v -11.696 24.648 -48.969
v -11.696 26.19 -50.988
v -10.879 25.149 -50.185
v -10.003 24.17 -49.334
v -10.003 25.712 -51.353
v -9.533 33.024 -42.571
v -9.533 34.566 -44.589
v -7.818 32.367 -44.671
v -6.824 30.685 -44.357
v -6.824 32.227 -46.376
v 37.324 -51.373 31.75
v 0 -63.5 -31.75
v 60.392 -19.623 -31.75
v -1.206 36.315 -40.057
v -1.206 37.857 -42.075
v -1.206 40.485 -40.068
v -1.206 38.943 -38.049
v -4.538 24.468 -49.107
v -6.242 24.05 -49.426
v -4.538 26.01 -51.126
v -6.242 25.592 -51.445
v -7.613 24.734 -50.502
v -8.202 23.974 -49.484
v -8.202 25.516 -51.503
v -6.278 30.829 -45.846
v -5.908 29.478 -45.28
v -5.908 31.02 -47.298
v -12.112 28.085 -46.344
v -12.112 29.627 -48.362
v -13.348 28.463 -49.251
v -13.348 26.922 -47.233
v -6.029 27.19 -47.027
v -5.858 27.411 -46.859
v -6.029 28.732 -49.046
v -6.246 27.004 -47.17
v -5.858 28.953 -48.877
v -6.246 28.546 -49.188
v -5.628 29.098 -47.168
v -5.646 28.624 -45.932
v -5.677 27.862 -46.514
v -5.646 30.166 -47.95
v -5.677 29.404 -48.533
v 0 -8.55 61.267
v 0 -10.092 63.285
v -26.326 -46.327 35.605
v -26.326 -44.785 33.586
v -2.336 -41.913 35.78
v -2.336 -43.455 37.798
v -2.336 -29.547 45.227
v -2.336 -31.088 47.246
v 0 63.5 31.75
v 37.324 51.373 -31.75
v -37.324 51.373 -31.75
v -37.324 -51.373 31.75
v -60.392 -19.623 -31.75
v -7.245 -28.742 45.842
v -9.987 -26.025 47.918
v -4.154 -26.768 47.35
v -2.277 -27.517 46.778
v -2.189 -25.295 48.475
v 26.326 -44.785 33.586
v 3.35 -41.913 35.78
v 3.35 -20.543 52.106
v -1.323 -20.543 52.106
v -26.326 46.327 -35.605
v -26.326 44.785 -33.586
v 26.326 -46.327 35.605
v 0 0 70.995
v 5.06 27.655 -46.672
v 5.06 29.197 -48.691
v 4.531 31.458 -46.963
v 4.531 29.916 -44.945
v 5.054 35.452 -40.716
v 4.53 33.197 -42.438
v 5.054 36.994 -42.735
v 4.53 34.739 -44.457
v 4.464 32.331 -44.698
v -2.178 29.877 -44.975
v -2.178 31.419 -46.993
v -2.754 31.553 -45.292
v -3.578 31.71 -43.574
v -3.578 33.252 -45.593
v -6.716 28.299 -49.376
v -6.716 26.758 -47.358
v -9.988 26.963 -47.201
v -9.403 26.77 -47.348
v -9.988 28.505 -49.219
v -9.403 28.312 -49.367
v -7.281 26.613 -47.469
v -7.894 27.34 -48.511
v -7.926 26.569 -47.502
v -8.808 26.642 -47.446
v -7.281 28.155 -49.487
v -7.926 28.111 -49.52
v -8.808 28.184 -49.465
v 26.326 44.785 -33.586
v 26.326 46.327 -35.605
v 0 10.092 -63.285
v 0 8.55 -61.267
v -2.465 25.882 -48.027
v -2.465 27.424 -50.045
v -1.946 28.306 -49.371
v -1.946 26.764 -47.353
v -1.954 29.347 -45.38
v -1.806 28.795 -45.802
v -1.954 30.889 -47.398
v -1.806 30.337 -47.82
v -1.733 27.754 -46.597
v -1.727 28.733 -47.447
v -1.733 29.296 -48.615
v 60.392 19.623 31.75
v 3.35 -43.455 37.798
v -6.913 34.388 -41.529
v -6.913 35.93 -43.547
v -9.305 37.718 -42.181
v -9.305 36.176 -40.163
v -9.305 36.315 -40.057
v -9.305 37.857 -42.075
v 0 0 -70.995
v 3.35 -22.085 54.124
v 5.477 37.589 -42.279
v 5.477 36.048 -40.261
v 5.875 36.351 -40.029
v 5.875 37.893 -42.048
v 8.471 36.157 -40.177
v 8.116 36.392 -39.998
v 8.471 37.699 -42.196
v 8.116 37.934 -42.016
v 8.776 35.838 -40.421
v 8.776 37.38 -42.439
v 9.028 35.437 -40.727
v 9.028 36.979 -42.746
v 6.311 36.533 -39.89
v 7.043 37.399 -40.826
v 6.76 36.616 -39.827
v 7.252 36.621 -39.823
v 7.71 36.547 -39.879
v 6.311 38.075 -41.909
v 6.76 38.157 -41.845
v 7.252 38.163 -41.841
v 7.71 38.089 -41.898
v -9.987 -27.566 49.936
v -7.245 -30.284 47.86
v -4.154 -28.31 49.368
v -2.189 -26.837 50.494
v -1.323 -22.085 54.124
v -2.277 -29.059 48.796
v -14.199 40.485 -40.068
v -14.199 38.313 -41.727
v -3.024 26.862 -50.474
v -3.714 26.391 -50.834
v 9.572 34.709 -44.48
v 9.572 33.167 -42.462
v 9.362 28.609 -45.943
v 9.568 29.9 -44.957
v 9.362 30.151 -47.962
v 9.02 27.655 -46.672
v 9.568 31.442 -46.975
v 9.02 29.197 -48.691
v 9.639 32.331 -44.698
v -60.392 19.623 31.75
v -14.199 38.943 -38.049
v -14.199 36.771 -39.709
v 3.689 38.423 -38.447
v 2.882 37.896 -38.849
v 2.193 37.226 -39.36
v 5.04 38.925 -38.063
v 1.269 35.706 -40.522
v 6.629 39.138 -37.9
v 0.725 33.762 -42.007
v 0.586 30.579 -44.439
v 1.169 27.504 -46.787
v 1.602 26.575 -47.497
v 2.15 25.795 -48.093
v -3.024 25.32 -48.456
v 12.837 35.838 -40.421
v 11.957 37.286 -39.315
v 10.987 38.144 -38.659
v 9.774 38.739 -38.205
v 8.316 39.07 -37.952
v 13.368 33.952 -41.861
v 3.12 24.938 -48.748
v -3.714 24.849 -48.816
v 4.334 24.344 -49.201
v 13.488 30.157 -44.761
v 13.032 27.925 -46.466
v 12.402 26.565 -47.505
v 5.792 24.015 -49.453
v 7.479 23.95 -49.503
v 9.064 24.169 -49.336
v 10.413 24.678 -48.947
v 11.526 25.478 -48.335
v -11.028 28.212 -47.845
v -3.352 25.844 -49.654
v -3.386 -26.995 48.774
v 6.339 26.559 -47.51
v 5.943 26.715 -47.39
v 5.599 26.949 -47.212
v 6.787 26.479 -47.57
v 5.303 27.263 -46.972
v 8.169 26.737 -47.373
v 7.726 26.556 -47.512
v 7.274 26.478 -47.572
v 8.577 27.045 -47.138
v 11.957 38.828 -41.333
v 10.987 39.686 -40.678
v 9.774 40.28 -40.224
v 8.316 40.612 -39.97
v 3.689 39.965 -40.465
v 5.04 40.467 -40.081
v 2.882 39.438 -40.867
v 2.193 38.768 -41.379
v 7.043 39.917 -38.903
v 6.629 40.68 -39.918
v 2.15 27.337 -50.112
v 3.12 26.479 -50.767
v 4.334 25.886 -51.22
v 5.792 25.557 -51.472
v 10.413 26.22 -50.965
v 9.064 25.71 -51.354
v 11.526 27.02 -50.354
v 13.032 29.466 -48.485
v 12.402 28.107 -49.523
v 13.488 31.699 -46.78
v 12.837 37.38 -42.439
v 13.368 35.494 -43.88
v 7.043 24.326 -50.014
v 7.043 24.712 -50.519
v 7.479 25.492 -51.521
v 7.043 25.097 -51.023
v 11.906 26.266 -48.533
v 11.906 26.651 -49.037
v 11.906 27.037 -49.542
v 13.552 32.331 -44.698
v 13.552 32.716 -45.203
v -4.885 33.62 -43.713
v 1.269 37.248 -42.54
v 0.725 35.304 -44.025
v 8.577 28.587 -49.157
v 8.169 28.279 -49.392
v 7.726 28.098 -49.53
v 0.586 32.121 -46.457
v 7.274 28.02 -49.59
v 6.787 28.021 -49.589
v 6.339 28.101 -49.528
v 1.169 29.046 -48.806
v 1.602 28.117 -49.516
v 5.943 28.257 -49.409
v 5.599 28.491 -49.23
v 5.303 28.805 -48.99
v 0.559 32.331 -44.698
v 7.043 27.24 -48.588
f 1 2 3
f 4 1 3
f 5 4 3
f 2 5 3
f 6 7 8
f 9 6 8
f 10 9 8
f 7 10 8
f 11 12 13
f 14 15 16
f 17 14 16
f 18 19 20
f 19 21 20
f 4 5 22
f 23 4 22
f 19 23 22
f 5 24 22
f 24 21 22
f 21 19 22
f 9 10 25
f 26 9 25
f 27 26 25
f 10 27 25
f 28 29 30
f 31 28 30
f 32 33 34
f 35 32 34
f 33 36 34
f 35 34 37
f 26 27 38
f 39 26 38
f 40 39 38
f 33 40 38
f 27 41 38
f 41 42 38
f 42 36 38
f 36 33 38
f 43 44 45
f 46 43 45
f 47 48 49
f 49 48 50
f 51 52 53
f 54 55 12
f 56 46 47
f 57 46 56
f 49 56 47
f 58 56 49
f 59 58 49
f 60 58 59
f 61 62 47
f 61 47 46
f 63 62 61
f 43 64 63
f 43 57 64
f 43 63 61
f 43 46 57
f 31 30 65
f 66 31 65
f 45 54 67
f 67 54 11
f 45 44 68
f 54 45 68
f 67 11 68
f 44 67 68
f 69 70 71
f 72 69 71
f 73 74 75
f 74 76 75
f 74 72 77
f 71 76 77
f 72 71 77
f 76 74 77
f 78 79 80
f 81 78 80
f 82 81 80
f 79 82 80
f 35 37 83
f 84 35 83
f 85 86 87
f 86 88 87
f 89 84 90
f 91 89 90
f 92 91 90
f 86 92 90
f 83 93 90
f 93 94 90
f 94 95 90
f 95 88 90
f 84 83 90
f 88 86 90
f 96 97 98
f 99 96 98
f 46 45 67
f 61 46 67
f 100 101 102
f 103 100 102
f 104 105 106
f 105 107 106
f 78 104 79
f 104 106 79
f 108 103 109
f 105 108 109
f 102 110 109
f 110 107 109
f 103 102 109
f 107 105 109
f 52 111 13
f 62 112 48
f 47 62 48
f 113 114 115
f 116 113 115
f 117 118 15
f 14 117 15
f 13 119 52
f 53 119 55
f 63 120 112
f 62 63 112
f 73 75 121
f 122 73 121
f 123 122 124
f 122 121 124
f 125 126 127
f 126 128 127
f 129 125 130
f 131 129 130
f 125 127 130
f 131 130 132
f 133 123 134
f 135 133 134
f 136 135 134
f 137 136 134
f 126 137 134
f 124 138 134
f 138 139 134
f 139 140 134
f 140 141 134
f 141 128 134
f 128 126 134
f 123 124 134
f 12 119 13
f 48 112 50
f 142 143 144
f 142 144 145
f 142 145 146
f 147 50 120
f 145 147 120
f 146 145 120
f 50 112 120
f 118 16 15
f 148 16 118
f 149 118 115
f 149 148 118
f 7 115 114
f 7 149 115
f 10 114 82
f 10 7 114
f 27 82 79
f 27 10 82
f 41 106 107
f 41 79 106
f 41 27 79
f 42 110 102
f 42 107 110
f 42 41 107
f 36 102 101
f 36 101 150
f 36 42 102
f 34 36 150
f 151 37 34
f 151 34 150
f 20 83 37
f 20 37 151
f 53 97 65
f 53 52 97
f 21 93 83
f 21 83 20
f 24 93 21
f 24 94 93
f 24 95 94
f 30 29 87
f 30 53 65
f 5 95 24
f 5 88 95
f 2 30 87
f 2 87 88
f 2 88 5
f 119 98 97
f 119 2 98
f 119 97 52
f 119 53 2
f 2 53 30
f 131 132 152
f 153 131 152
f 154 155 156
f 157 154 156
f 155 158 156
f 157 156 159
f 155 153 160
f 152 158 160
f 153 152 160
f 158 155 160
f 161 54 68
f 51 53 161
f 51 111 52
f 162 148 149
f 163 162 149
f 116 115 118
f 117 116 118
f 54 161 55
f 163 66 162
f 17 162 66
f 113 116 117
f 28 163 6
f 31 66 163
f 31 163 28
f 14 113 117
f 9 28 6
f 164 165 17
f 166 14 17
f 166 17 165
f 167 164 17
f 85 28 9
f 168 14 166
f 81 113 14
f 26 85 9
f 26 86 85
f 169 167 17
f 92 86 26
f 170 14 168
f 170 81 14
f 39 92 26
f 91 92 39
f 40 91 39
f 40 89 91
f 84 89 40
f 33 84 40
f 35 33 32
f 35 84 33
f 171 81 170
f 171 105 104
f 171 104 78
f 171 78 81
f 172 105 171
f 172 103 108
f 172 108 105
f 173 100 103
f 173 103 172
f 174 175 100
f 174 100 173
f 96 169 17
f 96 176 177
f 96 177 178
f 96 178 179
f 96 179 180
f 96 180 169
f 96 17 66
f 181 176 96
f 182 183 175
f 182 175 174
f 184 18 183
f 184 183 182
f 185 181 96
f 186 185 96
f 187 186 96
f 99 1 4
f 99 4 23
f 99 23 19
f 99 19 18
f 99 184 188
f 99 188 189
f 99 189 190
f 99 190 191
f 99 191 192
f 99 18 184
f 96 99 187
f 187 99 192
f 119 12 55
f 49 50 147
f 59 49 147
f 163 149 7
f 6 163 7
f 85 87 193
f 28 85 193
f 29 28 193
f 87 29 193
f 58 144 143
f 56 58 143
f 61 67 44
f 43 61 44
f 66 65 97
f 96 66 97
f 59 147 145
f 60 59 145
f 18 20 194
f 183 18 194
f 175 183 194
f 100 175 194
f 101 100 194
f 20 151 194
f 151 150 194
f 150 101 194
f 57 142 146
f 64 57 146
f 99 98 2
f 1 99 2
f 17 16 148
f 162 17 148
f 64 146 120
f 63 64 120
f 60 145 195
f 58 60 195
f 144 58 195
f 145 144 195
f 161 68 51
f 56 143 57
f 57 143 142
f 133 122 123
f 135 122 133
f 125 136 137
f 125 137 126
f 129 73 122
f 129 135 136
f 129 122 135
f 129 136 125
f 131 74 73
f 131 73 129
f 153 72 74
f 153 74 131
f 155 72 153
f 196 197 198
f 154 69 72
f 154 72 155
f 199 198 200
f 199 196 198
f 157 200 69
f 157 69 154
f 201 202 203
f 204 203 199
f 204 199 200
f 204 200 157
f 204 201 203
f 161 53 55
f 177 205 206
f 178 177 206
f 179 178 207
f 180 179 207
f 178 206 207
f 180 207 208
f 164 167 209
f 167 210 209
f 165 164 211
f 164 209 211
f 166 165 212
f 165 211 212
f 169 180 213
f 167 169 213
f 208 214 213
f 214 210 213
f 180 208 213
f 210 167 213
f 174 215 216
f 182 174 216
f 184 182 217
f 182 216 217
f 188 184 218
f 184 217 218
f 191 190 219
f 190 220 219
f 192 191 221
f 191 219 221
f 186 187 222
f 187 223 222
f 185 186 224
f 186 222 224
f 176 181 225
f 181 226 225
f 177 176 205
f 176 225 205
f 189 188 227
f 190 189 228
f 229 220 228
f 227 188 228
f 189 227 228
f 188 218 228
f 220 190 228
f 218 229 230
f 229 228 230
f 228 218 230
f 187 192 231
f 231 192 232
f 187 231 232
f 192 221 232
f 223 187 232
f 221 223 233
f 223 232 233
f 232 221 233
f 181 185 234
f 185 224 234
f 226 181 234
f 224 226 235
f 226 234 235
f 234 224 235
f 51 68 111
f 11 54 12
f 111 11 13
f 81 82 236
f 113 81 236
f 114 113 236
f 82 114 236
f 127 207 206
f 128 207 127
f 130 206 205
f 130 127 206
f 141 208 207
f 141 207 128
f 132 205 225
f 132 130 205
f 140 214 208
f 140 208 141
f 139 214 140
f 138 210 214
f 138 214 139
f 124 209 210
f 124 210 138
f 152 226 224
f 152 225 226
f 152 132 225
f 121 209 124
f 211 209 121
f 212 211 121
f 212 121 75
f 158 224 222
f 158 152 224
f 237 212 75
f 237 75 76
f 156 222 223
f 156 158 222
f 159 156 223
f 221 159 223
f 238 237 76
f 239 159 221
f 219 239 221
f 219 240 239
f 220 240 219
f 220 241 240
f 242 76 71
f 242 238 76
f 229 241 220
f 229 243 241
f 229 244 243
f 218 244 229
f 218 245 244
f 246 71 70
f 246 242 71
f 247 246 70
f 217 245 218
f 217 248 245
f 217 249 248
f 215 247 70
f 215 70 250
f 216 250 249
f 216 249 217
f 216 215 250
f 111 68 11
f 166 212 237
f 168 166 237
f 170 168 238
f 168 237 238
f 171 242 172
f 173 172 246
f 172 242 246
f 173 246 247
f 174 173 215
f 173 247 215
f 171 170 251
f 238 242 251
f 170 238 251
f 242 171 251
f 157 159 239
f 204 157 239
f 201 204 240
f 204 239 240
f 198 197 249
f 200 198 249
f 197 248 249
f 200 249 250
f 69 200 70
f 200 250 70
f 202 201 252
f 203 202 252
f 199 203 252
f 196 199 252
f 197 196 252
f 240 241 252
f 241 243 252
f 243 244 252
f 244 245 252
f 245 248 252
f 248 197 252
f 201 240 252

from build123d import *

# Parameters (mm, degrees)
F12_DEPTH      = 37.3243635206
F12_DEPTH_BACK = 37.3243635206
F15_DEPTH      = 37.3243635206
F15_DEPTH_BACK = 37.3243635206
F18_DEPTH      = 37.3243635206
F18_DEPTH_BACK = 37.3243635206
F21_DEPTH      = 37.3243635206
F21_DEPTH_BACK = 37.3243635206
F24_DEPTH      = 37.3243635206
F24_DEPTH_BACK = 37.3243635206
F28_DEPTH      = 99.1671965959
F28_DEPTH_BACK = 99.1671965959
F32_DEPTH      = 89.4601183415
F32_DEPTH_BACK = 89.4601183415
F35_DEPTH      = 89.4601183415
F35_DEPTH_BACK = 88.5596960493
F39_DEPTH      = 99.1671965959
F39_DEPTH_BACK = 96.8098604305
F42_DEPTH      = 68.0823305395
F42_DEPTH_BACK = 70.9961582856
F45_DEPTH      = 92.4043169267
F45_DEPTH_BACK = 99.1671965959
F48_DEPTH      = 81.4313769211
F48_DEPTH_BACK = 89.4601183415
F52_DEPTH      = 88.5596960493
F52_DEPTH_BACK = 82.3317992133
F56_DEPTH      = 92.4043169267
F56_DEPTH_BACK = 96.8098604305
F59_DEPTH      = 68.0823305395
F59_DEPTH_BACK = 68.0823305395
F62_DEPTH      = 37.3243635206
F62_DEPTH_BACK = 37.3243635206
F65_DEPTH      = 68.0823305395
F65_DEPTH_BACK = 68.0823305395
F68_DEPTH      = 81.4313769211
F68_DEPTH_BACK = 81.4313769211
F71_DEPTH      = 92.4043169267
F71_DEPTH_BACK = 92.4043169267
F74_DEPTH      = 92.4043169267
F74_DEPTH_BACK = 92.4043169267
F76_DEPTH      = 2.54
F78_DEPTH      = 2.54


# Not quite as in the source:
# - a feature names something its author has since deleted; it is built from what else it names


with BuildPart() as f9:
    # F7 (on Front) → F9 (revolve)
    with BuildSketch(Plane.XZ):
        with BuildLine():
            Line((0, 0), (0, 31.75))
            Line((0, 31.75), (0, 70.9951582856))
            ThreePointArc((0, 70.9951582856), (-70.9951582856, 0), (0, -70.9951582856))
            Line((0, -70.9951582856), (0, -31.75))
            Line((0, -31.75), (0, 0))
        make_face()
    revolve(axis=Axis((0, 0, -35.4975791428), (0, 0, -1)))

    # F11 (on 3pt) → F12 (cut, two sides)
    with BuildSketch(Plane(origin=(0, 0, 0), x_dir=(-0.5877852523, 0.8090169944, 0), z_dir=(0.8090169944, 0.5877852523, 0))) as f12_sk:
        Polygon((-63.5, -70.9951582856), (0, -70.9951582856), (-51.3725791428, -31.75), (-63.5, -31.75), align=None)
    extrude(amount=F12_DEPTH, mode=Mode.SUBTRACT)
    extrude(f12_sk.sketch, amount=-F12_DEPTH_BACK, mode=Mode.SUBTRACT)

    # F14 (on 3pt) → F15 (cut, two sides)
    with BuildSketch(Plane(origin=(0, 0, 0), x_dir=(-0.5877852523, -0.8090169944, 0), z_dir=(-0.8090169944, 0.5877852523, 0))) as f15_sk:
        Polygon((51.3725791428, -31.75), (0, -70.9951582856), (63.5, -70.9951582856), (63.5, -31.75), align=None)
    extrude(amount=-F15_DEPTH, mode=Mode.SUBTRACT)
    extrude(f15_sk.sketch, amount=F15_DEPTH_BACK, mode=Mode.SUBTRACT)

    # F17 (on 3pt) → F18 (cut, two sides)
    with BuildSketch(Plane(origin=(0, 0, 0), x_dir=(0.9510565163, -0.3090169944, 0), z_dir=(-0.3090169944, -0.9510565163, 0))) as f18_sk:
        Polygon((-63.5, -70.9951582856), (0, -70.9951582856), (-51.3725791428, -31.75), (-63.5, -31.75), align=None)
    extrude(amount=-F18_DEPTH, mode=Mode.SUBTRACT)
    extrude(f18_sk.sketch, amount=F18_DEPTH_BACK, mode=Mode.SUBTRACT)

    # F20 (on 3pt) → F21 (cut, two sides)
    with BuildSketch(Plane.YZ) as f21_sk:
        Polygon((51.3725791428, -31.75), (0, -70.9951582856), (63.5, -70.9951582856), (63.5, -31.75), align=None)
    extrude(amount=-F21_DEPTH, mode=Mode.SUBTRACT)
    extrude(f21_sk.sketch, amount=F21_DEPTH_BACK, mode=Mode.SUBTRACT)

    # F23 (on 3pt) → F24 (cut, two sides)
    with BuildSketch(Plane(origin=(0, 0, 0), x_dir=(-0.9510565163, -0.3090169944, 0), z_dir=(-0.3090169944, 0.9510565163, 0))) as f24_sk:
        Polygon((-63.5, -70.9951582856), (0, -70.9951582856), (-51.3725791428, -31.75), (-63.5, -31.75), align=None)
    extrude(amount=F24_DEPTH, mode=Mode.SUBTRACT)
    extrude(f24_sk.sketch, amount=-F24_DEPTH_BACK, mode=Mode.SUBTRACT)

    # F27 (on 3pt) → F28 (cut, two sides)
    with BuildSketch(Plane(origin=(0, 0, 0), x_dir=(-0.5877852523, 0.8090169944, 0), z_dir=(0.8090169944, 0.5877852523, 0))) as f28_sk:
        Polygon((-70.9951582856, -31.75), (-51.3725791428, -31.75), (-63.5, 31.75), (-70.9951582856, 31.75), align=None)
    extrude(amount=F28_DEPTH, mode=Mode.SUBTRACT)
    extrude(f28_sk.sketch, amount=-F28_DEPTH_BACK, mode=Mode.SUBTRACT)

    # F31 (on 3pt) → F32 (cut, two sides)
    with BuildSketch(Plane(origin=(0, 0, 0), x_dir=(0.9510565163, -0.3090169944, 0), z_dir=(-0.3090169944, -0.9510565163, 0))) as f32_sk:
        Polygon((70.9951582856, 31.75), (51.3725791428, 31.75), (63.5, -31.75), (70.9951582856, -31.75), align=None)
    extrude(amount=-F32_DEPTH, mode=Mode.SUBTRACT)
    extrude(f32_sk.sketch, amount=F32_DEPTH_BACK, mode=Mode.SUBTRACT)

    # F34 (on 3pt) → F35 (cut, two sides)
    with BuildSketch(Plane(origin=(0, 0, 0), x_dir=(0.9510565163, 0.3090169944, 0), z_dir=(0.3090169944, -0.9510565163, 0))) as f35_sk:
        Polygon((63.5, 31.75), (51.3725791428, -31.75), (70.9951582856, -31.75), (70.9951582856, 31.75), align=None)
    extrude(amount=-F35_DEPTH, mode=Mode.SUBTRACT)
    extrude(f35_sk.sketch, amount=F35_DEPTH_BACK, mode=Mode.SUBTRACT)

    # F38 (on 3pt) → F39 (cut, two sides)
    with BuildSketch(Plane(origin=(0, 0, 0), x_dir=(0.5877852523, 0.8090169944, 0), z_dir=(0.8090169944, -0.5877852523, 0))) as f39_sk:
        Polygon((70.9951582856, 31.75), (51.3725791428, 31.75), (63.5, -31.75), (70.9951582856, -31.75), align=None)
    extrude(amount=-F39_DEPTH, mode=Mode.SUBTRACT)
    extrude(f39_sk.sketch, amount=F39_DEPTH_BACK, mode=Mode.SUBTRACT)

    # F41 (on 3pt) → F42 (cut, two sides)
    with BuildSketch(Plane(origin=(0, 0, 0), x_dir=(0, -1, 0), z_dir=(-1, 0, 0))) as f42_sk:
        Polygon((-70.9951582856, -31.75), (-51.3725791428, -31.75), (-63.5, 31.75), (-70.9951582856, 31.75), align=None)
    extrude(amount=-F42_DEPTH, mode=Mode.SUBTRACT)
    extrude(f42_sk.sketch, amount=F42_DEPTH_BACK, mode=Mode.SUBTRACT)

    # F44 (on 3pt) → F45 (cut, two sides)
    with BuildSketch(Plane(origin=(0, 0, 0), x_dir=(0.5877852523, -0.8090169944, 0), z_dir=(-0.8090169944, -0.5877852523, 0))) as f45_sk:
        Polygon((-63.5, -31.75), (-51.3725791428, 31.75), (-70.9951582856, 31.75), (-70.9951582856, -31.75), align=None)
    extrude(amount=-F45_DEPTH, mode=Mode.SUBTRACT)
    extrude(f45_sk.sketch, amount=F45_DEPTH_BACK, mode=Mode.SUBTRACT)

    # F47 (on 3pt) → F48 (cut, two sides)
    with BuildSketch(Plane(origin=(0, 0, 0), x_dir=(0.9510565163, -0.3090169944, 0), z_dir=(-0.3090169944, -0.9510565163, 0))) as f48_sk:
        Polygon((-70.9951582856, -31.75), (-51.3725791428, -31.75), (-63.5, 31.75), (-70.9951582856, 31.75), align=None)
    extrude(amount=-F48_DEPTH, mode=Mode.SUBTRACT)
    extrude(f48_sk.sketch, amount=F48_DEPTH_BACK, mode=Mode.SUBTRACT)

    # F51 (on 3pt) → F52 (cut, two sides)
    with BuildSketch(Plane(origin=(0, 0, 0), x_dir=(-0.9510565163, -0.3090169944, 0), z_dir=(-0.3090169944, 0.9510565163, 0))) as f52_sk:
        Polygon((70.9951582856, 31.75), (51.3725791428, 31.75), (63.5, -31.75), (70.9951582856, -31.75), align=None)
    extrude(amount=-F52_DEPTH, mode=Mode.SUBTRACT)
    extrude(f52_sk.sketch, amount=F52_DEPTH_BACK, mode=Mode.SUBTRACT)

    # F55 (on 3pt) → F56 (cut, two sides)
    with BuildSketch(Plane(origin=(0, 0, 0), x_dir=(0.5877852523, 0.8090169944, 0), z_dir=(0.8090169944, -0.5877852523, 0))) as f56_sk:
        Polygon((-70.9951582856, -31.75), (-51.3725791428, -31.75), (-63.5, 31.75), (-70.9951582856, 31.75), align=None)
    extrude(amount=-F56_DEPTH, mode=Mode.SUBTRACT)
    extrude(f56_sk.sketch, amount=F56_DEPTH_BACK, mode=Mode.SUBTRACT)

    # F58 (on 3pt) → F59 (cut, two sides)
    with BuildSketch(Plane(origin=(0, 0, 0), x_dir=(0, -1, 0), z_dir=(-1, 0, 0))) as f59_sk:
        Polygon((70.9951582856, 31.75), (51.3725791428, 31.75), (63.5, -31.75), (70.9951582856, -31.75), align=None)
    extrude(amount=-F59_DEPTH, mode=Mode.SUBTRACT)
    extrude(f59_sk.sketch, amount=F59_DEPTH_BACK, mode=Mode.SUBTRACT)

    # F61 (on 3pt) → F62 (cut, two sides)
    with BuildSketch(Plane(origin=(0, 0, 0), x_dir=(0.9510565163, -0.3090169944, 0), z_dir=(-0.3090169944, -0.9510565163, 0))) as f62_sk:
        Polygon((63.5, 70.9951582856), (0, 70.9951582856), (51.3725791428, 31.75), (63.5, 31.75), align=None)
    extrude(amount=F62_DEPTH, mode=Mode.SUBTRACT)
    extrude(f62_sk.sketch, amount=-F62_DEPTH_BACK, mode=Mode.SUBTRACT)

    # F64 (on 3pt) → F65 (cut, two sides)
    with BuildSketch(Plane.YZ) as f65_sk:
        Polygon((-51.3725791428, 31.75), (0, 70.9951582856), (-63.5, 70.9951582856), (-63.5, 31.75), align=None)
    extrude(amount=-F65_DEPTH, mode=Mode.SUBTRACT)
    extrude(f65_sk.sketch, amount=F65_DEPTH_BACK, mode=Mode.SUBTRACT)

    # F67 (on 3pt) → F68 (cut, two sides)
    with BuildSketch(Plane(origin=(0, 0, 0), x_dir=(0.9510565163, 0.3090169944, 0), z_dir=(0.3090169944, -0.9510565163, 0))) as f68_sk:
        Polygon((-51.3725791428, 31.75), (0, 70.9951582856), (-63.5, 70.9951582856), (-63.5, 31.75), align=None)
    extrude(amount=-F68_DEPTH, mode=Mode.SUBTRACT)
    extrude(f68_sk.sketch, amount=F68_DEPTH_BACK, mode=Mode.SUBTRACT)

    # F70 (on 3pt) → F71 (cut, two sides)
    with BuildSketch(Plane(origin=(0, 0, 0), x_dir=(-0.5877852523, 0.8090169944, 0), z_dir=(0.8090169944, 0.5877852523, 0))) as f71_sk:
        Polygon((63.5, 70.9951582856), (0, 70.9951582856), (51.3725791428, 31.75), (63.5, 31.75), align=None)
    extrude(amount=-F71_DEPTH, mode=Mode.SUBTRACT)
    extrude(f71_sk.sketch, amount=F71_DEPTH_BACK, mode=Mode.SUBTRACT)

    # F73 (on 3pt) → F74 (cut, two sides)
    with BuildSketch(Plane(origin=(0, 0, 0), x_dir=(0.5877852523, 0.8090169944, 0), z_dir=(0.8090169944, -0.5877852523, 0))) as f74_sk:
        Polygon((63.5, 70.9951582856), (0, 70.9951582856), (51.3725791428, 31.75), (63.5, 31.75), align=None)
    extrude(amount=-F74_DEPTH, mode=Mode.SUBTRACT)
    extrude(f74_sk.sketch, amount=F74_DEPTH_BACK, mode=Mode.SUBTRACT)

    # F75 (on face) → F76 (cut)
    with BuildSketch(Plane(origin=(0, -34.2483860952, 44.8317194285), x_dir=(1, 0, 0), z_dir=(0, -0.6070619982, 0.7946544723))):
        Polygon((26.3258408925, -15.1992313259), (0, 30.3984626519), (-26.3258408925, -15.1992313259), align=None)
        with BuildLine():
            Line((3.3501555036, 15.3069211224), (3.3501555036, -11.5860768557))
            Line((3.3501555036, -11.5860768557), (-2.335691738, -11.5860768557))
            Line((-2.335691738, -11.5860768557), (-2.335691738, 3.9764284308))
            Line((-2.335691738, 3.9764284308), (-2.2768320357, 6.5309395104))
            Line((-2.2768320357, 6.5309395104), (-2.1885424823, 9.3267753694))
            add(Edge.make_bspline(
                [(-2.1885424823, 9.3267753694), (-3.6011753374, 7.9141425143), (-4.1544565389, 7.4726947471)],
                knots=[0, 0, 0, 1, 1, 1], degree=2))
            Line((-4.1544565389, 7.4726947471), (-7.2445909094, 4.9888153103))
            Line((-7.2445909094, 4.9888153103), (-9.9874530363, 8.4085640136))
            Line((-9.9874530363, 8.4085640136), (-1.3233048586, 15.3069211224))
            Line((-1.3233048586, 15.3069211224), (3.3501555036, 15.3069211224))
        make_face(mode=Mode.SUBTRACT)
    extrude(amount=-F76_DEPTH, mode=Mode.SUBTRACT)

    # F77 (on face) → F78 (cut)
    with BuildSketch(Plane(origin=(0, 34.2483860952, -44.8317194285), x_dir=(1, 0, 0), z_dir=(0, 0.6070619982, -0.7946544723))):
        with BuildLine():
            Line((26.3258408925, -15.1992313259), (0, 30.3984626519))
            Line((0, 30.3984626519), (-11.6958512292, 10.1406540851))
            add(Edge.make_bspline(
                [(-11.6958512292, 10.1406540851), (-10.9085633152, 10.5210577591), (-10.0027118644, 10.7419129699)],
                knots=[0.151662927, 0.151662927, 0.151662927, 1, 1, 1], degree=2))
            add(Edge.make_bspline(
                [(-10.0027118644, 10.7419129699), (-8.9349152542, 11.002251953), (-7.6128813559, 11.002251953)],
                knots=[0, 0, 0, 1, 1, 1], degree=2))
            add(Edge.make_bspline(
                [(-7.6128813559, 11.002251953), (-5.8718644068, 11.002251953), (-4.5376271186, 10.3676756818)],
                knots=[0, 0, 0, 1, 1, 1], degree=2))
            add(Edge.make_bspline(
                [(-4.5376271186, 10.3676756818), (-3.2033898305, 9.7330994106), (-2.4650847458, 8.5880146649)],
                knots=[0, 0, 0, 1, 1, 1], degree=2))
            add(Edge.make_bspline(
                [(-2.4650847458, 8.5880146649), (-1.726779661, 7.4429299191), (-1.726779661, 5.9703875462)],
                knots=[0, 0, 0, 1, 1, 1], degree=2))
            add(Edge.make_bspline(
                [(-1.726779661, 5.9703875462), (-1.726779661, 4.6849638174), (-2.1783050847, 3.5602180547)],
                knots=[0, 0, 0, 1, 1, 1], degree=2))
            add(Edge.make_bspline(
                [(-2.1783050847, 3.5602180547), (-2.6298305085, 2.435472292), (-3.5776271186, 1.2537773767)],
                knots=[0, 0, 0, 1, 1, 1], degree=2))
            add(Edge.make_bspline(
                [(-3.5776271186, 1.2537773767), (-4.5254237288, 0.0720824615), (-6.913220339, -2.1163921148)],
                knots=[0, 0, 0, 1, 1, 1], degree=2))
            Line((-6.913220339, -2.1163921148), (-9.3050847458, -4.3658836402))
            Line((-9.3050847458, -4.3658836402), (-9.3050847458, -4.5407988945))
            Line((-9.3050847458, -4.5407988945), (-1.2061016949, -4.5407988945))
            Line((-1.2061016949, -4.5407988945), (-1.2061016949, -7.8479175385))
            Line((-1.2061016949, -7.8479175385), (-14.1986440678, -7.8479175385))
            Line((-14.1986440678, -7.8479175385), (-14.1986440678, -5.1143582165))
            Line((-14.1986440678, -5.1143582165), (-9.5328813559, -0.3997819453))
            add(Edge.make_bspline(
                [(-9.5328813559, -0.3997819453), (-7.4583050847, 1.7236078852), (-6.8237288136, 2.5432689022)],
                knots=[0, 0, 0, 1, 1, 1], degree=2))
            add(Edge.make_bspline(
                [(-6.8237288136, 2.5432689022), (-6.1891525424, 3.3629299191), (-5.9084745763, 4.0625909361)],
                knots=[0, 0, 0, 1, 1, 1], degree=2))
            add(Edge.make_bspline(
                [(-5.9084745763, 4.0625909361), (-5.6277966102, 4.762251953), (-5.6277966102, 5.5107265293)],
                knots=[0, 0, 0, 1, 1, 1], degree=2))
            add(Edge.make_bspline(
                [(-5.6277966102, 5.5107265293), (-5.6277966102, 6.6293705971), (-6.2461016949, 7.1764892411)],
                knots=[0, 0, 0, 1, 1, 1], degree=2))
            add(Edge.make_bspline(
                [(-6.2461016949, 7.1764892411), (-6.8644067797, 7.7236078852), (-7.893559322, 7.7236078852)],
                knots=[0, 0, 0, 1, 1, 1], degree=2))
            add(Edge.make_bspline(
                [(-7.893559322, 7.7236078852), (-8.9715254237, 7.7236078852), (-9.9884745763, 7.2273366988)],
                knots=[0, 0, 0, 1, 1, 1], degree=2))
            add(Edge.make_bspline(
                [(-9.9884745763, 7.2273366988), (-11.0054237288, 6.7310655123), (-12.1118644068, 5.815811275)],
                knots=[0, 0, 0, 1, 1, 1], degree=2))
            Line((-12.1118644068, 5.815811275), (-13.3475580235, 7.2798139981))
            Line((-13.3475580235, 7.2798139981), (-26.3258408925, -15.1992313259))
            Line((-26.3258408925, -15.1992313259), (26.3258408925, -15.1992313259))
        make_face()
        with BuildLine():
            add(Edge.make_bspline(
                [(11.906440678, 8.5900485632), (13.5518644068, 6.1493705971), (13.5518644068, 1.4429299191)],
                knots=[0, 0, 0, 1, 1, 1], degree=2))
            add(Edge.make_bspline(
                [(13.5518644068, 1.4429299191), (13.5518644068, -3.4221548267), (11.9572881356, -5.7631717758)],
                knots=[0, 0, 0, 1, 1, 1], degree=2))
            add(Edge.make_bspline(
                [(11.9572881356, -5.7631717758), (10.3627118644, -8.104188725), (7.0433898305, -8.104188725)],
                knots=[0, 0, 0, 1, 1, 1], degree=2))
            add(Edge.make_bspline(
                [(7.0433898305, -8.104188725), (3.8257627119, -8.104188725), (2.1925423729, -5.6879175385)],
                knots=[0, 0, 0, 1, 1, 1], degree=2))
            add(Edge.make_bspline(
                [(2.1925423729, -5.6879175385), (0.5593220339, -3.2716463521), (0.5593220339, 1.4429299191)],
                knots=[0, 0, 0, 1, 1, 1], degree=2))
            add(Edge.make_bspline(
                [(0.5593220339, 1.4429299191), (0.5593220339, 6.3649638174), (2.1498305085, 8.6978451733)],
                knots=[0, 0, 0, 1, 1, 1], degree=2))
            add(Edge.make_bspline(
                [(2.1498305085, 8.6978451733), (3.7403389831, 11.0307265293), (7.0433898305, 11.0307265293)],
                knots=[0, 0, 0, 1, 1, 1], degree=2))
            add(Edge.make_bspline(
                [(7.0433898305, 11.0307265293), (10.2610169492, 11.0307265293), (11.906440678, 8.5900485632)],
                knots=[0, 0, 0, 1, 1, 1], degree=2))
        make_face(mode=Mode.SUBTRACT)
        with BuildLine():
            add(Edge.make_bspline(
                [(5.0603389831, 6.3568282242), (4.4644067797, 4.8639468683), (4.4644067797, 1.4429299191)],
                knots=[0, 0, 0, 1, 1, 1], degree=2))
            add(Edge.make_bspline(
                [(4.4644067797, 1.4429299191), (4.4644067797, -1.9740192334), (5.0542372881, -3.4546971995)],
                knots=[0, 0, 0, 1, 1, 1], degree=2))
            add(Edge.make_bspline(
                [(5.0542372881, -3.4546971995), (5.6440677966, -4.9353751656), (7.0433898305, -4.9353751656)],
                knots=[0, 0, 0, 1, 1, 1], degree=2))
            add(Edge.make_bspline(
                [(7.0433898305, -4.9353751656), (8.4183050847, -4.9353751656), (9.0284745763, -3.4363921148)],
                knots=[0, 0, 0, 1, 1, 1], degree=2))
            add(Edge.make_bspline(
                [(9.0284745763, -3.4363921148), (9.6386440678, -1.9374090639), (9.6386440678, 1.4429299191)],
                knots=[0, 0, 0, 1, 1, 1], degree=2))
            add(Edge.make_bspline(
                [(9.6386440678, 1.4429299191), (9.6386440678, 4.8639468683), (9.0203389831, 6.3568282242)],
                knots=[0, 0, 0, 1, 1, 1], degree=2))
            add(Edge.make_bspline(
                [(9.0203389831, 6.3568282242), (8.4020338983, 7.8497095801), (7.0433898305, 7.8497095801)],
                knots=[0, 0, 0, 1, 1, 1], degree=2))
            add(Edge.make_bspline(
                [(7.0433898305, 7.8497095801), (5.6562711864, 7.8497095801), (5.0603389831, 6.3568282242)],
                knots=[0, 0, 0, 1, 1, 1], degree=2))
        make_face()
    extrude(amount=-F78_DEPTH, mode=Mode.SUBTRACT)


solid = f9.part
